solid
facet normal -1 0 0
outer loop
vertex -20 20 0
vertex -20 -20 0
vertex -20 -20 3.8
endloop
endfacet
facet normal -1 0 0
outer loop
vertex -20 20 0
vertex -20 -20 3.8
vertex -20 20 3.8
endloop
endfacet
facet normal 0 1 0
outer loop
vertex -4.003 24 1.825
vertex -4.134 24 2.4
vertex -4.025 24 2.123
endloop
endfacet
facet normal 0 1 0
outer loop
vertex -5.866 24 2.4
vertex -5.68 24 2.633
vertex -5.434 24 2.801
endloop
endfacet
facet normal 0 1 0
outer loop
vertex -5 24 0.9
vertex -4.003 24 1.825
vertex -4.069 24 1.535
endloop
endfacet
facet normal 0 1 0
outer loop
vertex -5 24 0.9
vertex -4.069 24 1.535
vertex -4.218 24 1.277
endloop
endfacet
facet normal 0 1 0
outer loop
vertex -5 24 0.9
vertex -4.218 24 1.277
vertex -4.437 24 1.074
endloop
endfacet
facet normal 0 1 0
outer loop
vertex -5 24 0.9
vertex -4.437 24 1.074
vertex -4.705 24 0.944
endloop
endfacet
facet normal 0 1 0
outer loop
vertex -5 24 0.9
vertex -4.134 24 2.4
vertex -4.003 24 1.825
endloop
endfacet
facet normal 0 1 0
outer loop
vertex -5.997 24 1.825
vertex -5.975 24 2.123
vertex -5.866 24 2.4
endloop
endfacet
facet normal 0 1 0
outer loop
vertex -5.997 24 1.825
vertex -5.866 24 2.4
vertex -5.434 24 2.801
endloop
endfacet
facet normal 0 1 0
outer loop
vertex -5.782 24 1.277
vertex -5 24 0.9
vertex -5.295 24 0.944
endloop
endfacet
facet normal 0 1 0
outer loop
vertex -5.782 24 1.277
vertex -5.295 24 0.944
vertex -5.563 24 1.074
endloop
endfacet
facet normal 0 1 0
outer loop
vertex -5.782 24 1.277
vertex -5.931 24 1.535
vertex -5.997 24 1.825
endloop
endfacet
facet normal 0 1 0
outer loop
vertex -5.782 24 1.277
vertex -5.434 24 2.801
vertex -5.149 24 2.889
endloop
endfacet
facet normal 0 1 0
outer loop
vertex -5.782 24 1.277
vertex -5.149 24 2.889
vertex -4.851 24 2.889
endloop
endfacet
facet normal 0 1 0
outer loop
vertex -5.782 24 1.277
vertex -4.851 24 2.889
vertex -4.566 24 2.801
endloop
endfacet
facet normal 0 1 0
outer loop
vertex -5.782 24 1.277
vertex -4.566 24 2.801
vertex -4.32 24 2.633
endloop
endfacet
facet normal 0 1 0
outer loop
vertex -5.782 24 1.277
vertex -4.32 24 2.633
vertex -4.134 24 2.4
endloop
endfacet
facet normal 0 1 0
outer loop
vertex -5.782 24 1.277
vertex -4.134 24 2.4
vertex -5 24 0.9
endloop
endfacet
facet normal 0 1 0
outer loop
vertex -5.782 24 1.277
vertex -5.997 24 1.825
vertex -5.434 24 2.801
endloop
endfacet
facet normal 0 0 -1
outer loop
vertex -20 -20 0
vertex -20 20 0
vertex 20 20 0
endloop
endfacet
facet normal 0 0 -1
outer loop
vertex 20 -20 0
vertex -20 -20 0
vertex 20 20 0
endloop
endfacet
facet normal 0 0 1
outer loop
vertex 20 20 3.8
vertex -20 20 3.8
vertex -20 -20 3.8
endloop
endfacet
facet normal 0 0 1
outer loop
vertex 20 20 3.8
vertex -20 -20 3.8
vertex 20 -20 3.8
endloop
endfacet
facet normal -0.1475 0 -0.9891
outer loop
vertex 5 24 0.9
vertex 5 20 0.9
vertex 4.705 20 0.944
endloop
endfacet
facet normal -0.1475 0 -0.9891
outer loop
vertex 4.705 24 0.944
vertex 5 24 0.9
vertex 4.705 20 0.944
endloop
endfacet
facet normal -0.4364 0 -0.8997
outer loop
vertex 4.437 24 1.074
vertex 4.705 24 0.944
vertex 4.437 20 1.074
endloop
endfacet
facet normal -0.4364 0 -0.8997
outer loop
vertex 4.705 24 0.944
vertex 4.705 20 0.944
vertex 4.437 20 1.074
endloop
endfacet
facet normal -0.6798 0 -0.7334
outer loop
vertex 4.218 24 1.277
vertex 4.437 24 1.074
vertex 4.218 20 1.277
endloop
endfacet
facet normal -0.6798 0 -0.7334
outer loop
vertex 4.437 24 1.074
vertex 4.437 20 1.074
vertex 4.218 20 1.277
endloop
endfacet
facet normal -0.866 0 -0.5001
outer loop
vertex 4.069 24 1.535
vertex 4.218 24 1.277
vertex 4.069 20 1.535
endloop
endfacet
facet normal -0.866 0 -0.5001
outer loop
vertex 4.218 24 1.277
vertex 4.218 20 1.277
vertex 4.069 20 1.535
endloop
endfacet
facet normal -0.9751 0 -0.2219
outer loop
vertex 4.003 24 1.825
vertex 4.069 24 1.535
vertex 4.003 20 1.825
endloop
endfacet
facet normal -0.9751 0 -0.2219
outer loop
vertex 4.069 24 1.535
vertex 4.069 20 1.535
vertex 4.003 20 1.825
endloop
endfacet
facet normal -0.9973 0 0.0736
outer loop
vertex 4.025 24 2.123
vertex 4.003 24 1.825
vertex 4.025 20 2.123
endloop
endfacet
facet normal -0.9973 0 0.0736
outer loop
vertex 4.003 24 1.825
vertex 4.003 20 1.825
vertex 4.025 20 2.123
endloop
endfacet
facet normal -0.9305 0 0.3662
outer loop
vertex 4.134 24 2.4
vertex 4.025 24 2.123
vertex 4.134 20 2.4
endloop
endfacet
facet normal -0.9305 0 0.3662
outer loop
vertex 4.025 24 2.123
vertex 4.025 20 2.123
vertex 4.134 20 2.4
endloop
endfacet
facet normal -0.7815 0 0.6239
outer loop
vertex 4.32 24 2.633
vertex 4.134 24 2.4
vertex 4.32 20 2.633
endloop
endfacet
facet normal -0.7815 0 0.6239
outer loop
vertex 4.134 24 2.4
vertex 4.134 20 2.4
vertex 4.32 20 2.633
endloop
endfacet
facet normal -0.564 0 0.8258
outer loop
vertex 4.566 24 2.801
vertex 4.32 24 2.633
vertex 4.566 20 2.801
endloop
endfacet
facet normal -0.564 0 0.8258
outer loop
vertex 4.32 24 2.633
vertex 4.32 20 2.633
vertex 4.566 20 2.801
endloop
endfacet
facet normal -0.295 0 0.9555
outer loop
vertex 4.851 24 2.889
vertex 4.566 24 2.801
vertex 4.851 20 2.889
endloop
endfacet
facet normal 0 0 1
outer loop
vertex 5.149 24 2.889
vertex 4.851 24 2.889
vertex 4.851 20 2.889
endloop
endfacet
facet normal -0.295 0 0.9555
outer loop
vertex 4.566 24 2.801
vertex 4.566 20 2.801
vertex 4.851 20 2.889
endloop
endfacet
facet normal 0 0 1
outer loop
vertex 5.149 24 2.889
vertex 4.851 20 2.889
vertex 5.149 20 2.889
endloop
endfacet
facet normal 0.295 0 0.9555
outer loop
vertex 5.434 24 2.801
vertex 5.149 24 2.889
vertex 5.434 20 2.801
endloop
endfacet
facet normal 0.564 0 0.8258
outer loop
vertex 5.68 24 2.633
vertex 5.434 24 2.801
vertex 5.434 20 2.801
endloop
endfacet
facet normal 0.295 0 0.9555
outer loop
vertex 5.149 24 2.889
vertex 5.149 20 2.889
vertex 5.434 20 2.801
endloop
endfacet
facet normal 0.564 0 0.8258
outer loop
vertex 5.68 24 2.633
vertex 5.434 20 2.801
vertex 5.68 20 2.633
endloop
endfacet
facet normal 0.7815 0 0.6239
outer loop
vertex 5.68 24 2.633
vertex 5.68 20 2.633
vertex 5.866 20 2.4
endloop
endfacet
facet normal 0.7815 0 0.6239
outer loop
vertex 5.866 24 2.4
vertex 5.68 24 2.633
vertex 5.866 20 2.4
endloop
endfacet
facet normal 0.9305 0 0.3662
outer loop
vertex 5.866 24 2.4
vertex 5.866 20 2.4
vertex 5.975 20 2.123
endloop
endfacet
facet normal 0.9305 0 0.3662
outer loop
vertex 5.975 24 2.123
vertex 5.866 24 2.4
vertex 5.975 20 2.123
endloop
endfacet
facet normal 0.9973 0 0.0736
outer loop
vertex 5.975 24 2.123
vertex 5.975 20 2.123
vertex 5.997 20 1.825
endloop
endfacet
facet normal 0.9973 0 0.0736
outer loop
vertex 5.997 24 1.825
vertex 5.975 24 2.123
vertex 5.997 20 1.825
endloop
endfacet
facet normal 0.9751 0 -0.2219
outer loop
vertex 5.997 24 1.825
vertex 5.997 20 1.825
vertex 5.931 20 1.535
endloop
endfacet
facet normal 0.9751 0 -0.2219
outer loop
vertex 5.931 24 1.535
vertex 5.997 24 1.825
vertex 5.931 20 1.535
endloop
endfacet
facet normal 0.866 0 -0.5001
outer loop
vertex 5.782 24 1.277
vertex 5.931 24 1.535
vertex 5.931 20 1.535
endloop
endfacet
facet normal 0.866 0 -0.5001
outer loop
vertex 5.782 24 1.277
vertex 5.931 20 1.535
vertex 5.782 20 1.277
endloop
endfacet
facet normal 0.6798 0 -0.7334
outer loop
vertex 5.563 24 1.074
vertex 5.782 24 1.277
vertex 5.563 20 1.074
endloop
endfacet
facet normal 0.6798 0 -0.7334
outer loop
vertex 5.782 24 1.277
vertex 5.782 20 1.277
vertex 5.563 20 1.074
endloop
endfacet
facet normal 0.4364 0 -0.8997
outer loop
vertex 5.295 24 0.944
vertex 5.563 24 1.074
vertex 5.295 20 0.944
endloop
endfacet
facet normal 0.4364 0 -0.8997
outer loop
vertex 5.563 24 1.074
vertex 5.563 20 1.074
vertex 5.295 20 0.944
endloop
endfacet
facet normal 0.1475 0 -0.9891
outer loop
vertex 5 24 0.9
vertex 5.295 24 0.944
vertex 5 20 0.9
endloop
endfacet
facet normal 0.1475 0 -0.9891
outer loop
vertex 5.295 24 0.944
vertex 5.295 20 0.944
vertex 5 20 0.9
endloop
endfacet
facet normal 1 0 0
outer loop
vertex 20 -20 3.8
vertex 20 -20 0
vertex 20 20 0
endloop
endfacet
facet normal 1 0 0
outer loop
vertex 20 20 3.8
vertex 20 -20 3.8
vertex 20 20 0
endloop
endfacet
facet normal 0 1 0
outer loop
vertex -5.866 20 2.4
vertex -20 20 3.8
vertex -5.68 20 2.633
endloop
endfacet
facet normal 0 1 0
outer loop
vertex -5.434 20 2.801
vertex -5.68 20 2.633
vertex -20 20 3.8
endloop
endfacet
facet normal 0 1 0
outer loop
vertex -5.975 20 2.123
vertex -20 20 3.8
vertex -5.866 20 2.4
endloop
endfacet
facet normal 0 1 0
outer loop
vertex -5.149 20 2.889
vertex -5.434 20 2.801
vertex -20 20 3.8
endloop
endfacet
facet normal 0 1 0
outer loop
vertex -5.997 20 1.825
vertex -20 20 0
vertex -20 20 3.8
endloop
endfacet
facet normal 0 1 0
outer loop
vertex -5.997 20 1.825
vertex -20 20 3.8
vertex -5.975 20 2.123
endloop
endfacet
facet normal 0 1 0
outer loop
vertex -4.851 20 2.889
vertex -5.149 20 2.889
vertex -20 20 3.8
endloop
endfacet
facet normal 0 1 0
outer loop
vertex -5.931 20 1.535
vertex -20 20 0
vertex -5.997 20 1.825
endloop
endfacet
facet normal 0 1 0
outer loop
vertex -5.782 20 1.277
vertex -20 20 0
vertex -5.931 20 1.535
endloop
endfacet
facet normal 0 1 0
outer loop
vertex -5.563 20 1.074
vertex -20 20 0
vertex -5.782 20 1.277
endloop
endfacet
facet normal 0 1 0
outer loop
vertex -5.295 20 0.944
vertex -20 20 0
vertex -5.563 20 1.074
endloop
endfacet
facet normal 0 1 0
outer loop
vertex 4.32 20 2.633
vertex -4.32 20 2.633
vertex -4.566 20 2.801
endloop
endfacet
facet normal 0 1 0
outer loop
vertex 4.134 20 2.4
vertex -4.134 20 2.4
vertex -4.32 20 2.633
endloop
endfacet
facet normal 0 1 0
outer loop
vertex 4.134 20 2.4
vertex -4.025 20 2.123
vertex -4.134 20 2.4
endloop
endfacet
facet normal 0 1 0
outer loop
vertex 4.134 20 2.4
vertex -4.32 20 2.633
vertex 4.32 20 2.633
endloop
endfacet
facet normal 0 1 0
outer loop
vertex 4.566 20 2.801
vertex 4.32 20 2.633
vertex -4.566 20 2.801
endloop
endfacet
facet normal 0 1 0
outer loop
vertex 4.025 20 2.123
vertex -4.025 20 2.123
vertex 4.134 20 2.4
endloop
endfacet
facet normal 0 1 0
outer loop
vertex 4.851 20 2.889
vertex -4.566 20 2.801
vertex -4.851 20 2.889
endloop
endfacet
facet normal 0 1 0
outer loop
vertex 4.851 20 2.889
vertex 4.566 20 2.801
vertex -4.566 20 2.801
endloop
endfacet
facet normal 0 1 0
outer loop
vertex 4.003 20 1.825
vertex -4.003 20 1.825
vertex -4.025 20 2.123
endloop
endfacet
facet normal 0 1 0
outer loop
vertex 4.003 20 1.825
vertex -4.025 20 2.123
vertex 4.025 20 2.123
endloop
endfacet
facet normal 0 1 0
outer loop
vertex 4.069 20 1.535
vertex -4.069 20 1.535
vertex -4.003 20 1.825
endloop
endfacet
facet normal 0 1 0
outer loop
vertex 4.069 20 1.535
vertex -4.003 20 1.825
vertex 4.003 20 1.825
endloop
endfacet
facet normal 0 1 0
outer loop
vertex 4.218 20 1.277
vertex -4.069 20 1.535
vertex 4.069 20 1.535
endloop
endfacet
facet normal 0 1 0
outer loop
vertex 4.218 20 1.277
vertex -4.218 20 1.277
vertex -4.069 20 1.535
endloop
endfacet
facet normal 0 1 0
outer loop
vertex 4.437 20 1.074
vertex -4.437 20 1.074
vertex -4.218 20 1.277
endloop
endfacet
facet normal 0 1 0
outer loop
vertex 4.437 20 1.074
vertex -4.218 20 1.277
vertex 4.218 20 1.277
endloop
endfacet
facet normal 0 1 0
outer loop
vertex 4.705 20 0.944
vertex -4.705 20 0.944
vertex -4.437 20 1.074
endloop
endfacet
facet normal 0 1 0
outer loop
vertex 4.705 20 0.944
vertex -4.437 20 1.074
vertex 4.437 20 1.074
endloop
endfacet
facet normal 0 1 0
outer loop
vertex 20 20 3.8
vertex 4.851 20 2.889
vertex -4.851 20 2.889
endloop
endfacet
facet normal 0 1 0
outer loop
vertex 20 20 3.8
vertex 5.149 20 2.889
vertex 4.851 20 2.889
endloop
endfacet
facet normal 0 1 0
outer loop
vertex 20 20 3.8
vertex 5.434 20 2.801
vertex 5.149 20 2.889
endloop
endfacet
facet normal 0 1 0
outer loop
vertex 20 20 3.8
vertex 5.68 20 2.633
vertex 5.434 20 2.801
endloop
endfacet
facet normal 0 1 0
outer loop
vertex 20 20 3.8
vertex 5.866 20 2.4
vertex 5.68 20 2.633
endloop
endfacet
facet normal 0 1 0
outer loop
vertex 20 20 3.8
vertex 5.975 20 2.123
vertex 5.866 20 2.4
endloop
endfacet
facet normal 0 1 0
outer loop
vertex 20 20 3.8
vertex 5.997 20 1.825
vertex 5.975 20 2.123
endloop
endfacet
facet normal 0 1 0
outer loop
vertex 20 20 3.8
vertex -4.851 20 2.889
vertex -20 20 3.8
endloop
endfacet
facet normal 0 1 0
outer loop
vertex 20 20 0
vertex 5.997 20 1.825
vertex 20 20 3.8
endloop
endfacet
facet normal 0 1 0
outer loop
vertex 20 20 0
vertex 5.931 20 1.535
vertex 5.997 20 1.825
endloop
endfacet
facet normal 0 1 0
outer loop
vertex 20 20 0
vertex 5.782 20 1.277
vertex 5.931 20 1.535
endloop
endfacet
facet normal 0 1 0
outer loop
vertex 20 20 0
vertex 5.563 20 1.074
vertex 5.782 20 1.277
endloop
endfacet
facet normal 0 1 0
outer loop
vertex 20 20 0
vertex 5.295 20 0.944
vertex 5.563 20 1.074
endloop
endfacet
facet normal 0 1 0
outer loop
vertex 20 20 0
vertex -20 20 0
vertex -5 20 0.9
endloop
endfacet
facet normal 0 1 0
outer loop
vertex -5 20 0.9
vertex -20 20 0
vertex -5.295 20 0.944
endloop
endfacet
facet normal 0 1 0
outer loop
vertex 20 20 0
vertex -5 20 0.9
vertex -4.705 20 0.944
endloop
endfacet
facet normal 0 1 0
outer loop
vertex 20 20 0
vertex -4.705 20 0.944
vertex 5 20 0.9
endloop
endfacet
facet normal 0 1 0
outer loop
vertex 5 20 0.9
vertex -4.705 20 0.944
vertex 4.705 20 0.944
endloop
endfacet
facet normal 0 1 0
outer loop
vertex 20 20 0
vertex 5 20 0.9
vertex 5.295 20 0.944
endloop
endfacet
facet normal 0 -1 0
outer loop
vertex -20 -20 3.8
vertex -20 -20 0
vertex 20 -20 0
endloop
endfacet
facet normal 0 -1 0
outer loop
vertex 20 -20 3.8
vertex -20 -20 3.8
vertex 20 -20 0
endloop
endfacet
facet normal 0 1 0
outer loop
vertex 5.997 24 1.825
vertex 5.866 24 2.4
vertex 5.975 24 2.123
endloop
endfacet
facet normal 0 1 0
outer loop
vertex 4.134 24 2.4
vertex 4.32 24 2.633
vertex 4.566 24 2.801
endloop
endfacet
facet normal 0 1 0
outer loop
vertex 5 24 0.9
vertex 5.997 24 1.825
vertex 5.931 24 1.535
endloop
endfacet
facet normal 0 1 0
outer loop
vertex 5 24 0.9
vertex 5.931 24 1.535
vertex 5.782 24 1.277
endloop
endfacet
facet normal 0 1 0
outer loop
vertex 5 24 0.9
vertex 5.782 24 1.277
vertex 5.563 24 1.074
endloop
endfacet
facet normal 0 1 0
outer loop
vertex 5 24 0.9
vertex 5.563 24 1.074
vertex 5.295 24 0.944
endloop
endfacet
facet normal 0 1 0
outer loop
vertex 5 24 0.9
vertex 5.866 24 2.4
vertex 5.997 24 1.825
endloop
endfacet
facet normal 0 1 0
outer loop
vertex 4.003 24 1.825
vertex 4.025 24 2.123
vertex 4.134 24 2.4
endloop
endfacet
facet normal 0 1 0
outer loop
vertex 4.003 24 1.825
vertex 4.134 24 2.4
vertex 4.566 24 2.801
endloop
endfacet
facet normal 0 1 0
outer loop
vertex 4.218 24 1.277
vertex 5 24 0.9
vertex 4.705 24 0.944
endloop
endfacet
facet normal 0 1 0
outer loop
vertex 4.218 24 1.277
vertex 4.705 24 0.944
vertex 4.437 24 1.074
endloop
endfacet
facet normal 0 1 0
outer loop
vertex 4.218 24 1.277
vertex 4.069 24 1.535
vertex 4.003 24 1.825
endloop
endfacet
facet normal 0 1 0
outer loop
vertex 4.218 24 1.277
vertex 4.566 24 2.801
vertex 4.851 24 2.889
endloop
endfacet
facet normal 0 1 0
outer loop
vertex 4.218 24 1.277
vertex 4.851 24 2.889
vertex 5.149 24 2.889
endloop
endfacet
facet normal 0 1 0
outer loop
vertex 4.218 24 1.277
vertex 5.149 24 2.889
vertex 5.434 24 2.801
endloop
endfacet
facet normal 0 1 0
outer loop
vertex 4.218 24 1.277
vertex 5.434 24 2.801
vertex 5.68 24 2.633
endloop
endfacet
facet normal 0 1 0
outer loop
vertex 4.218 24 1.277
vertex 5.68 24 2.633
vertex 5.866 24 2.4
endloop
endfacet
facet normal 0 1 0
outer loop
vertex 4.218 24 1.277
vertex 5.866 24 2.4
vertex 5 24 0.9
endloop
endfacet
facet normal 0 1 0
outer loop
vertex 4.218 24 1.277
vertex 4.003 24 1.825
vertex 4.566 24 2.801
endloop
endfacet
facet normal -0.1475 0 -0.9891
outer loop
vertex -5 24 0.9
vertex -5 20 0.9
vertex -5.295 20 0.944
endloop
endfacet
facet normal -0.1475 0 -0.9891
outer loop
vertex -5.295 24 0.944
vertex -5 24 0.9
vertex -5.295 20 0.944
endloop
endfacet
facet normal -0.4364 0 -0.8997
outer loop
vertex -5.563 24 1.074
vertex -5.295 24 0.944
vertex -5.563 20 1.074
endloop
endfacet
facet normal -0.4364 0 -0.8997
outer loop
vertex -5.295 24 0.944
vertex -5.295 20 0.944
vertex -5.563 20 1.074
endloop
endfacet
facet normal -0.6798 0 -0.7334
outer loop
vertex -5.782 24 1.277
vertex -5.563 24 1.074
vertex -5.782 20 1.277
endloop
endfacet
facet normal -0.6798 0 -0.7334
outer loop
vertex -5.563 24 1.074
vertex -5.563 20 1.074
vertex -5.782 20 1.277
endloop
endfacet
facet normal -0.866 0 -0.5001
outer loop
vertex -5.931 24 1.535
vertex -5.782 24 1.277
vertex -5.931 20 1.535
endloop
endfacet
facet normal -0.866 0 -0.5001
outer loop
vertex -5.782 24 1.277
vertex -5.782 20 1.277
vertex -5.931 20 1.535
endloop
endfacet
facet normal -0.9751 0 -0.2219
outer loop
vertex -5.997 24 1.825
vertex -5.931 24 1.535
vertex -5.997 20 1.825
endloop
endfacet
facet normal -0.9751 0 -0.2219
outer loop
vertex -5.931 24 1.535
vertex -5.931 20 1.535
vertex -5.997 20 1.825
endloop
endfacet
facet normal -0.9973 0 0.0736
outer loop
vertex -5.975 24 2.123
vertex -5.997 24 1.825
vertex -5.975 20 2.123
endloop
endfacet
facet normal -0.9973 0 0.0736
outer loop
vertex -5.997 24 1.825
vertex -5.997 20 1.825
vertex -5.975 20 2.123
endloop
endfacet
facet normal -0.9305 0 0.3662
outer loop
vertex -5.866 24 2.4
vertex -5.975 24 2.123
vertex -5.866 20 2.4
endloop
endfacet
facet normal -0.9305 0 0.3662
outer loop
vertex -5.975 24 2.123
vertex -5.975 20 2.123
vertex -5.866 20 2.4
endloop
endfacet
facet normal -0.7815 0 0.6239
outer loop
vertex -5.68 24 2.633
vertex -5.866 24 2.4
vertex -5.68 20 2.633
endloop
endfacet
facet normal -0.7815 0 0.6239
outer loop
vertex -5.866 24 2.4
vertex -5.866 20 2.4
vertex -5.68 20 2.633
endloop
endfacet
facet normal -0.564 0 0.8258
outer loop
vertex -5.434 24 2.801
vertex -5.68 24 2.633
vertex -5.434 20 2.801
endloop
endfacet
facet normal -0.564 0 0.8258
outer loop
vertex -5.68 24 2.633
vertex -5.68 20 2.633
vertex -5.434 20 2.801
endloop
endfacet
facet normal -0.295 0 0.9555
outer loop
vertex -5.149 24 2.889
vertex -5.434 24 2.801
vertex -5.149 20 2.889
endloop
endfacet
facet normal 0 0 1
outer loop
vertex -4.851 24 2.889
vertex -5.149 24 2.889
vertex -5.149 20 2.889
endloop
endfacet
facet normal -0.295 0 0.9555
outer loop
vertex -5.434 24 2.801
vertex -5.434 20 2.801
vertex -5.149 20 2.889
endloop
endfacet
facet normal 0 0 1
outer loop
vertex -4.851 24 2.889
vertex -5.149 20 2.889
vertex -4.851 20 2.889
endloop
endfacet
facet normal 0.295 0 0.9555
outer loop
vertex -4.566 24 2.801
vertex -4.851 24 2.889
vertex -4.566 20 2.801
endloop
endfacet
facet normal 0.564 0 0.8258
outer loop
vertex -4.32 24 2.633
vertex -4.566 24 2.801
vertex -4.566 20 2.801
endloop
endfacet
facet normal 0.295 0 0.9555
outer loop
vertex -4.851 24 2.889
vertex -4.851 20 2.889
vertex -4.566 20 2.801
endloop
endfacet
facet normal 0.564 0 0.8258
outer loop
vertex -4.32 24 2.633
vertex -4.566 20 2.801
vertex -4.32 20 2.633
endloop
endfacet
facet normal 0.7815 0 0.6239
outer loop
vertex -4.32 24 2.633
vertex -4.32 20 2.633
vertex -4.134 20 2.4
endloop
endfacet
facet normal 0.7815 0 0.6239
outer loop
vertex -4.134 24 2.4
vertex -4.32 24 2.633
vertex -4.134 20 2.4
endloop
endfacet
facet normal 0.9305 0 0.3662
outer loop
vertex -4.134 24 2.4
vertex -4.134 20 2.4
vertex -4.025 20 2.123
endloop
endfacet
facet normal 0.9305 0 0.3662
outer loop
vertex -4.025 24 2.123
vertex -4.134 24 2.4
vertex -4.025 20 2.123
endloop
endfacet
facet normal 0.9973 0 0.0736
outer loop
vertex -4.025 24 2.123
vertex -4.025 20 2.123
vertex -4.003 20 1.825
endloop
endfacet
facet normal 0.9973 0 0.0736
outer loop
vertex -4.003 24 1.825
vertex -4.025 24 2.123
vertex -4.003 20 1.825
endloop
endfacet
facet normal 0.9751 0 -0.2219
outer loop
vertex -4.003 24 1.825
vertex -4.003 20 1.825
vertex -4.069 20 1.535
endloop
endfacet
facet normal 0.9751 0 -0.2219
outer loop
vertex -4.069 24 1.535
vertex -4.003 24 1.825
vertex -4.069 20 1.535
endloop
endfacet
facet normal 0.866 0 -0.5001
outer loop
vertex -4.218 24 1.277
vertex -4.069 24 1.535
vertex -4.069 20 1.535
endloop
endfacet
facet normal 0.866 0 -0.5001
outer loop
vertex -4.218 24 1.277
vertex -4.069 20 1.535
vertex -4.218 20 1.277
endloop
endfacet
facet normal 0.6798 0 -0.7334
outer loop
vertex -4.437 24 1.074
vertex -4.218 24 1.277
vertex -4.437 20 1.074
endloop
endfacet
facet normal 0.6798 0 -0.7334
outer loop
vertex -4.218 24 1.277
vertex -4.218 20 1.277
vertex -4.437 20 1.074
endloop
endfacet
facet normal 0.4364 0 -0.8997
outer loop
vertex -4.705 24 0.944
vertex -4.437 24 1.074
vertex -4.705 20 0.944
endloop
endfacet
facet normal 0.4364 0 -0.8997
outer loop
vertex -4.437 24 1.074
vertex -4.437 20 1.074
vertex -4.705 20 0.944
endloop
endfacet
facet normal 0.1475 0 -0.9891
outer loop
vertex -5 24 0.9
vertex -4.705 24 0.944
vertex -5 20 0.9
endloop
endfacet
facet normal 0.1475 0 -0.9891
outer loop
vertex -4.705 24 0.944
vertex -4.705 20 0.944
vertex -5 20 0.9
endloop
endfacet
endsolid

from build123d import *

# Parameters (mm, degrees)
SKETCH_1_W      = 40
SKETCH_1_H      = 40
EXTRUDE_1_DEPTH = 3.8
SKETCH_3_R      = 1
EXTRUDE_3_DEPTH = 4
SKETCH_4_R      = 1
EXTRUDE_4_DEPTH = 4


with BuildPart() as part:
    # 草图1 → 凸台-拉伸1 (new body)
    with BuildSketch(Plane.XY):
        Rectangle(SKETCH_1_W, SKETCH_1_H)
    extrude(amount=EXTRUDE_1_DEPTH)

    # 草图3 → 凸台-拉伸3 (add)
    with BuildSketch(Plane(origin=(0, 20, 0), x_dir=(1, 0, 0), z_dir=(0, 1, 0))):
        with Locations(Location((5, -1.9, 0), (0, 0, 90))):
            Circle(SKETCH_3_R)
    extrude(amount=EXTRUDE_3_DEPTH)

    # 草图4 → 凸台-拉伸4 (add)
    with BuildSketch(Plane(origin=(0, 20, 0), x_dir=(1, 0, 0), z_dir=(0, 1, 0))):
        with Locations(Location((-5, -1.9, 0), (0, 0, 90))):
            Circle(SKETCH_4_R)
    extrude(amount=EXTRUDE_4_DEPTH)


solid = part.part
